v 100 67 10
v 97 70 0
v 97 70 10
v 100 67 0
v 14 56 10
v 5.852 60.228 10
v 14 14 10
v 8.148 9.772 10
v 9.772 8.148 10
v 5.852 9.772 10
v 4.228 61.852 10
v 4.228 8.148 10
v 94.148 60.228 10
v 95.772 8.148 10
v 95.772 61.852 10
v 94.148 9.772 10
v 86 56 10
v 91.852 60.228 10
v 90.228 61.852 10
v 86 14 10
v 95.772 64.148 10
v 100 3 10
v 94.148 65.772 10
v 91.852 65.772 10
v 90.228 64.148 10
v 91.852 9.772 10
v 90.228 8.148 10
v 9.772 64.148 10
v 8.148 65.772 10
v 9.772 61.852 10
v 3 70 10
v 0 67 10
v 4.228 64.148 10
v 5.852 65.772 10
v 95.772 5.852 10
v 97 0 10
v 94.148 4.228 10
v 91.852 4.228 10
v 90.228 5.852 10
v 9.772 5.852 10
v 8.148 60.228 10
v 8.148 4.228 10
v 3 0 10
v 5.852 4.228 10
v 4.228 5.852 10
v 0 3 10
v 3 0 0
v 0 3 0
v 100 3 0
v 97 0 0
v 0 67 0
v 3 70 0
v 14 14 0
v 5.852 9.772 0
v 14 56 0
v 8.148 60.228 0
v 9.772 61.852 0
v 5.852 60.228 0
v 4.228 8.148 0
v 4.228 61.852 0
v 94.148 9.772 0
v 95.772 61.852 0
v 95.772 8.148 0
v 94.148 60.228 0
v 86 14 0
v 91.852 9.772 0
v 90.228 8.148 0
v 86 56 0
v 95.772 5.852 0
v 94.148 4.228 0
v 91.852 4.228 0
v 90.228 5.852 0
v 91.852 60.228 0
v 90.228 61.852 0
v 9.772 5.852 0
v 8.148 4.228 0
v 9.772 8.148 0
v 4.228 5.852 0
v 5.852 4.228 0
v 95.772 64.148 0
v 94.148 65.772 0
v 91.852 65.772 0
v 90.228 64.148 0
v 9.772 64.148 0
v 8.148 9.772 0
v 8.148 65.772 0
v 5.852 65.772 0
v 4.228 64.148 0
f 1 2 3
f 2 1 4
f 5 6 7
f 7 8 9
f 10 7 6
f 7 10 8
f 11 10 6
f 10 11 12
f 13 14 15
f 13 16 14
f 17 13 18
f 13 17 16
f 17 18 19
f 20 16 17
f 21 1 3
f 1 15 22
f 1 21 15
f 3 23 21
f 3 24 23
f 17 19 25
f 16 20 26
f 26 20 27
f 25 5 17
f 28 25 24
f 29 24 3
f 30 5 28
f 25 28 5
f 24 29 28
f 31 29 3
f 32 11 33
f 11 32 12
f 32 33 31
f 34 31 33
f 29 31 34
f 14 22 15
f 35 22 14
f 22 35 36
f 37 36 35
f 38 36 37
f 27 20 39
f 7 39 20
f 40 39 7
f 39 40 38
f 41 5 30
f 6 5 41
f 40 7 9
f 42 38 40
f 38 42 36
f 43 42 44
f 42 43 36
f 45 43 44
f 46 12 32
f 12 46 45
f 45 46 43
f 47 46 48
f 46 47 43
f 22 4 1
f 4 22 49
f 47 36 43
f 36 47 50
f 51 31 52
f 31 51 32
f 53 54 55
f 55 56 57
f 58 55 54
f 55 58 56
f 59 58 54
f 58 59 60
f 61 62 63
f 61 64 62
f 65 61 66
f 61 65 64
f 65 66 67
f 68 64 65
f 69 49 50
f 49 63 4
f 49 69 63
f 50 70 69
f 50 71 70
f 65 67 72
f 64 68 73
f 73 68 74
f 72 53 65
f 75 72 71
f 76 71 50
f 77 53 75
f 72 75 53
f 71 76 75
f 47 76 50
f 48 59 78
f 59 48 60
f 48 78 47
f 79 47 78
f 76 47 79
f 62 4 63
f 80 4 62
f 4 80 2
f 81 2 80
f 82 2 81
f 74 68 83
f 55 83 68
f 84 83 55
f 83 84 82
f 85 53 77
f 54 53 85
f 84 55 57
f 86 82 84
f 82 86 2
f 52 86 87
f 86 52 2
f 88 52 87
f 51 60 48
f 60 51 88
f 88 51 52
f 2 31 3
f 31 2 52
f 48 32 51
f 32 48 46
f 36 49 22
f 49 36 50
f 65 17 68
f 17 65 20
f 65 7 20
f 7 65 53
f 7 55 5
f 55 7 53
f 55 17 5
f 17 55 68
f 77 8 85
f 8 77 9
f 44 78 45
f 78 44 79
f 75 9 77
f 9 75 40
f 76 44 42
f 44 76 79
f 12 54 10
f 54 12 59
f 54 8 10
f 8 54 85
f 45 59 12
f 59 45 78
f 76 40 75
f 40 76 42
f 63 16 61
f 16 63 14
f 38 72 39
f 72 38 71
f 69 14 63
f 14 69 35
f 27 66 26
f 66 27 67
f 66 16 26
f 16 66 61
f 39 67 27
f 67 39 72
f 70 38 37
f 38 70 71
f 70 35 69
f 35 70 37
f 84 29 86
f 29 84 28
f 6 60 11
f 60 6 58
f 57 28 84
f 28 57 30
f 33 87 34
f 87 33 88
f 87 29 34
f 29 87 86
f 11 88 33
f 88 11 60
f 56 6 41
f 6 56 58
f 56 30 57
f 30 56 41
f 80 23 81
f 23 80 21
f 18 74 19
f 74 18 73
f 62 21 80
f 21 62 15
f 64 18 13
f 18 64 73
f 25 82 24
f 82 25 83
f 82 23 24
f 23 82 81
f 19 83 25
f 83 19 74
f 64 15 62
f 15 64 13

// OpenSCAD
$fn = 32;

// ----------------------------------------------------------------------
// Frame plate: 100 x 70 frame, 14 mm rails
// ----------------------------------------------------------------------

// --- parameters (mm) ---
plate_l = 100;            // plate length, X
plate_w = 70;             // plate width, Y
plate_t = 10;             // plate thickness, Z (extrusion height)
corner_c = 3;             // corner chamfer
frame_bar = 14;           // frame rail width
bolt_r = 3;               // corner bolt window radius
bolt_inset = 7;           // bolt centre inset from the edges
fit_tol = 0.05;           // declared fit tolerance (prompt contract)
free_tol = 0.2;           // declared free tolerance (prompt contract)

win_l = plate_l - 2 * frame_bar;  // window length
win_w = plate_w - 2 * frame_bar;  // window width
bolt_d = 2 * bolt_r;  // corner hole diameter

profile = [[3, 0], [97, 0], [100, 3], [100, 67], [97, 70], [3, 70], [0, 67], [0, 3]];  // primary outline, 8 points, counter clockwise
void_1 = [[14, 14], [86, 14], [86, 56], [14, 56]];  // the window, 4 points
void_2 = [[9.772, 8.148], [8.148, 9.772], [5.852, 9.772], [4.228, 8.148], [4.228, 5.852], [5.852, 4.228], [8.148, 4.228], [9.772, 5.852]];  // corner bolt window, 8 points
void_3 = [[95.772, 8.148], [94.148, 9.772], [91.852, 9.772], [90.228, 8.148], [90.228, 5.852], [91.852, 4.228], [94.148, 4.228], [95.772, 5.852]];  // corner bolt window, 8 points
void_4 = [[9.772, 64.148], [8.148, 65.772], [5.852, 65.772], [4.228, 64.148], [4.228, 61.852], [5.852, 60.228], [8.148, 60.228], [9.772, 61.852]];  // corner bolt window, 8 points
void_5 = [[95.772, 64.148], [94.148, 65.772], [91.852, 65.772], [90.228, 64.148], [90.228, 61.852], [91.852, 60.228], [94.148, 60.228], [95.772, 61.852]];  // corner bolt window, 8 points

// --- the one profile operation ---
difference() {
  linear_extrude(height = plate_t) polygon(points = profile);
  translate([0, 0, -1])
    linear_extrude(height = plate_t + 2) polygon(points = void_1);
  translate([0, 0, -1])
    linear_extrude(height = plate_t + 2) polygon(points = void_2);
  translate([0, 0, -1])
    linear_extrude(height = plate_t + 2) polygon(points = void_3);
  translate([0, 0, -1])
    linear_extrude(height = plate_t + 2) polygon(points = void_4);
  translate([0, 0, -1])
    linear_extrude(height = plate_t + 2) polygon(points = void_5);
}
